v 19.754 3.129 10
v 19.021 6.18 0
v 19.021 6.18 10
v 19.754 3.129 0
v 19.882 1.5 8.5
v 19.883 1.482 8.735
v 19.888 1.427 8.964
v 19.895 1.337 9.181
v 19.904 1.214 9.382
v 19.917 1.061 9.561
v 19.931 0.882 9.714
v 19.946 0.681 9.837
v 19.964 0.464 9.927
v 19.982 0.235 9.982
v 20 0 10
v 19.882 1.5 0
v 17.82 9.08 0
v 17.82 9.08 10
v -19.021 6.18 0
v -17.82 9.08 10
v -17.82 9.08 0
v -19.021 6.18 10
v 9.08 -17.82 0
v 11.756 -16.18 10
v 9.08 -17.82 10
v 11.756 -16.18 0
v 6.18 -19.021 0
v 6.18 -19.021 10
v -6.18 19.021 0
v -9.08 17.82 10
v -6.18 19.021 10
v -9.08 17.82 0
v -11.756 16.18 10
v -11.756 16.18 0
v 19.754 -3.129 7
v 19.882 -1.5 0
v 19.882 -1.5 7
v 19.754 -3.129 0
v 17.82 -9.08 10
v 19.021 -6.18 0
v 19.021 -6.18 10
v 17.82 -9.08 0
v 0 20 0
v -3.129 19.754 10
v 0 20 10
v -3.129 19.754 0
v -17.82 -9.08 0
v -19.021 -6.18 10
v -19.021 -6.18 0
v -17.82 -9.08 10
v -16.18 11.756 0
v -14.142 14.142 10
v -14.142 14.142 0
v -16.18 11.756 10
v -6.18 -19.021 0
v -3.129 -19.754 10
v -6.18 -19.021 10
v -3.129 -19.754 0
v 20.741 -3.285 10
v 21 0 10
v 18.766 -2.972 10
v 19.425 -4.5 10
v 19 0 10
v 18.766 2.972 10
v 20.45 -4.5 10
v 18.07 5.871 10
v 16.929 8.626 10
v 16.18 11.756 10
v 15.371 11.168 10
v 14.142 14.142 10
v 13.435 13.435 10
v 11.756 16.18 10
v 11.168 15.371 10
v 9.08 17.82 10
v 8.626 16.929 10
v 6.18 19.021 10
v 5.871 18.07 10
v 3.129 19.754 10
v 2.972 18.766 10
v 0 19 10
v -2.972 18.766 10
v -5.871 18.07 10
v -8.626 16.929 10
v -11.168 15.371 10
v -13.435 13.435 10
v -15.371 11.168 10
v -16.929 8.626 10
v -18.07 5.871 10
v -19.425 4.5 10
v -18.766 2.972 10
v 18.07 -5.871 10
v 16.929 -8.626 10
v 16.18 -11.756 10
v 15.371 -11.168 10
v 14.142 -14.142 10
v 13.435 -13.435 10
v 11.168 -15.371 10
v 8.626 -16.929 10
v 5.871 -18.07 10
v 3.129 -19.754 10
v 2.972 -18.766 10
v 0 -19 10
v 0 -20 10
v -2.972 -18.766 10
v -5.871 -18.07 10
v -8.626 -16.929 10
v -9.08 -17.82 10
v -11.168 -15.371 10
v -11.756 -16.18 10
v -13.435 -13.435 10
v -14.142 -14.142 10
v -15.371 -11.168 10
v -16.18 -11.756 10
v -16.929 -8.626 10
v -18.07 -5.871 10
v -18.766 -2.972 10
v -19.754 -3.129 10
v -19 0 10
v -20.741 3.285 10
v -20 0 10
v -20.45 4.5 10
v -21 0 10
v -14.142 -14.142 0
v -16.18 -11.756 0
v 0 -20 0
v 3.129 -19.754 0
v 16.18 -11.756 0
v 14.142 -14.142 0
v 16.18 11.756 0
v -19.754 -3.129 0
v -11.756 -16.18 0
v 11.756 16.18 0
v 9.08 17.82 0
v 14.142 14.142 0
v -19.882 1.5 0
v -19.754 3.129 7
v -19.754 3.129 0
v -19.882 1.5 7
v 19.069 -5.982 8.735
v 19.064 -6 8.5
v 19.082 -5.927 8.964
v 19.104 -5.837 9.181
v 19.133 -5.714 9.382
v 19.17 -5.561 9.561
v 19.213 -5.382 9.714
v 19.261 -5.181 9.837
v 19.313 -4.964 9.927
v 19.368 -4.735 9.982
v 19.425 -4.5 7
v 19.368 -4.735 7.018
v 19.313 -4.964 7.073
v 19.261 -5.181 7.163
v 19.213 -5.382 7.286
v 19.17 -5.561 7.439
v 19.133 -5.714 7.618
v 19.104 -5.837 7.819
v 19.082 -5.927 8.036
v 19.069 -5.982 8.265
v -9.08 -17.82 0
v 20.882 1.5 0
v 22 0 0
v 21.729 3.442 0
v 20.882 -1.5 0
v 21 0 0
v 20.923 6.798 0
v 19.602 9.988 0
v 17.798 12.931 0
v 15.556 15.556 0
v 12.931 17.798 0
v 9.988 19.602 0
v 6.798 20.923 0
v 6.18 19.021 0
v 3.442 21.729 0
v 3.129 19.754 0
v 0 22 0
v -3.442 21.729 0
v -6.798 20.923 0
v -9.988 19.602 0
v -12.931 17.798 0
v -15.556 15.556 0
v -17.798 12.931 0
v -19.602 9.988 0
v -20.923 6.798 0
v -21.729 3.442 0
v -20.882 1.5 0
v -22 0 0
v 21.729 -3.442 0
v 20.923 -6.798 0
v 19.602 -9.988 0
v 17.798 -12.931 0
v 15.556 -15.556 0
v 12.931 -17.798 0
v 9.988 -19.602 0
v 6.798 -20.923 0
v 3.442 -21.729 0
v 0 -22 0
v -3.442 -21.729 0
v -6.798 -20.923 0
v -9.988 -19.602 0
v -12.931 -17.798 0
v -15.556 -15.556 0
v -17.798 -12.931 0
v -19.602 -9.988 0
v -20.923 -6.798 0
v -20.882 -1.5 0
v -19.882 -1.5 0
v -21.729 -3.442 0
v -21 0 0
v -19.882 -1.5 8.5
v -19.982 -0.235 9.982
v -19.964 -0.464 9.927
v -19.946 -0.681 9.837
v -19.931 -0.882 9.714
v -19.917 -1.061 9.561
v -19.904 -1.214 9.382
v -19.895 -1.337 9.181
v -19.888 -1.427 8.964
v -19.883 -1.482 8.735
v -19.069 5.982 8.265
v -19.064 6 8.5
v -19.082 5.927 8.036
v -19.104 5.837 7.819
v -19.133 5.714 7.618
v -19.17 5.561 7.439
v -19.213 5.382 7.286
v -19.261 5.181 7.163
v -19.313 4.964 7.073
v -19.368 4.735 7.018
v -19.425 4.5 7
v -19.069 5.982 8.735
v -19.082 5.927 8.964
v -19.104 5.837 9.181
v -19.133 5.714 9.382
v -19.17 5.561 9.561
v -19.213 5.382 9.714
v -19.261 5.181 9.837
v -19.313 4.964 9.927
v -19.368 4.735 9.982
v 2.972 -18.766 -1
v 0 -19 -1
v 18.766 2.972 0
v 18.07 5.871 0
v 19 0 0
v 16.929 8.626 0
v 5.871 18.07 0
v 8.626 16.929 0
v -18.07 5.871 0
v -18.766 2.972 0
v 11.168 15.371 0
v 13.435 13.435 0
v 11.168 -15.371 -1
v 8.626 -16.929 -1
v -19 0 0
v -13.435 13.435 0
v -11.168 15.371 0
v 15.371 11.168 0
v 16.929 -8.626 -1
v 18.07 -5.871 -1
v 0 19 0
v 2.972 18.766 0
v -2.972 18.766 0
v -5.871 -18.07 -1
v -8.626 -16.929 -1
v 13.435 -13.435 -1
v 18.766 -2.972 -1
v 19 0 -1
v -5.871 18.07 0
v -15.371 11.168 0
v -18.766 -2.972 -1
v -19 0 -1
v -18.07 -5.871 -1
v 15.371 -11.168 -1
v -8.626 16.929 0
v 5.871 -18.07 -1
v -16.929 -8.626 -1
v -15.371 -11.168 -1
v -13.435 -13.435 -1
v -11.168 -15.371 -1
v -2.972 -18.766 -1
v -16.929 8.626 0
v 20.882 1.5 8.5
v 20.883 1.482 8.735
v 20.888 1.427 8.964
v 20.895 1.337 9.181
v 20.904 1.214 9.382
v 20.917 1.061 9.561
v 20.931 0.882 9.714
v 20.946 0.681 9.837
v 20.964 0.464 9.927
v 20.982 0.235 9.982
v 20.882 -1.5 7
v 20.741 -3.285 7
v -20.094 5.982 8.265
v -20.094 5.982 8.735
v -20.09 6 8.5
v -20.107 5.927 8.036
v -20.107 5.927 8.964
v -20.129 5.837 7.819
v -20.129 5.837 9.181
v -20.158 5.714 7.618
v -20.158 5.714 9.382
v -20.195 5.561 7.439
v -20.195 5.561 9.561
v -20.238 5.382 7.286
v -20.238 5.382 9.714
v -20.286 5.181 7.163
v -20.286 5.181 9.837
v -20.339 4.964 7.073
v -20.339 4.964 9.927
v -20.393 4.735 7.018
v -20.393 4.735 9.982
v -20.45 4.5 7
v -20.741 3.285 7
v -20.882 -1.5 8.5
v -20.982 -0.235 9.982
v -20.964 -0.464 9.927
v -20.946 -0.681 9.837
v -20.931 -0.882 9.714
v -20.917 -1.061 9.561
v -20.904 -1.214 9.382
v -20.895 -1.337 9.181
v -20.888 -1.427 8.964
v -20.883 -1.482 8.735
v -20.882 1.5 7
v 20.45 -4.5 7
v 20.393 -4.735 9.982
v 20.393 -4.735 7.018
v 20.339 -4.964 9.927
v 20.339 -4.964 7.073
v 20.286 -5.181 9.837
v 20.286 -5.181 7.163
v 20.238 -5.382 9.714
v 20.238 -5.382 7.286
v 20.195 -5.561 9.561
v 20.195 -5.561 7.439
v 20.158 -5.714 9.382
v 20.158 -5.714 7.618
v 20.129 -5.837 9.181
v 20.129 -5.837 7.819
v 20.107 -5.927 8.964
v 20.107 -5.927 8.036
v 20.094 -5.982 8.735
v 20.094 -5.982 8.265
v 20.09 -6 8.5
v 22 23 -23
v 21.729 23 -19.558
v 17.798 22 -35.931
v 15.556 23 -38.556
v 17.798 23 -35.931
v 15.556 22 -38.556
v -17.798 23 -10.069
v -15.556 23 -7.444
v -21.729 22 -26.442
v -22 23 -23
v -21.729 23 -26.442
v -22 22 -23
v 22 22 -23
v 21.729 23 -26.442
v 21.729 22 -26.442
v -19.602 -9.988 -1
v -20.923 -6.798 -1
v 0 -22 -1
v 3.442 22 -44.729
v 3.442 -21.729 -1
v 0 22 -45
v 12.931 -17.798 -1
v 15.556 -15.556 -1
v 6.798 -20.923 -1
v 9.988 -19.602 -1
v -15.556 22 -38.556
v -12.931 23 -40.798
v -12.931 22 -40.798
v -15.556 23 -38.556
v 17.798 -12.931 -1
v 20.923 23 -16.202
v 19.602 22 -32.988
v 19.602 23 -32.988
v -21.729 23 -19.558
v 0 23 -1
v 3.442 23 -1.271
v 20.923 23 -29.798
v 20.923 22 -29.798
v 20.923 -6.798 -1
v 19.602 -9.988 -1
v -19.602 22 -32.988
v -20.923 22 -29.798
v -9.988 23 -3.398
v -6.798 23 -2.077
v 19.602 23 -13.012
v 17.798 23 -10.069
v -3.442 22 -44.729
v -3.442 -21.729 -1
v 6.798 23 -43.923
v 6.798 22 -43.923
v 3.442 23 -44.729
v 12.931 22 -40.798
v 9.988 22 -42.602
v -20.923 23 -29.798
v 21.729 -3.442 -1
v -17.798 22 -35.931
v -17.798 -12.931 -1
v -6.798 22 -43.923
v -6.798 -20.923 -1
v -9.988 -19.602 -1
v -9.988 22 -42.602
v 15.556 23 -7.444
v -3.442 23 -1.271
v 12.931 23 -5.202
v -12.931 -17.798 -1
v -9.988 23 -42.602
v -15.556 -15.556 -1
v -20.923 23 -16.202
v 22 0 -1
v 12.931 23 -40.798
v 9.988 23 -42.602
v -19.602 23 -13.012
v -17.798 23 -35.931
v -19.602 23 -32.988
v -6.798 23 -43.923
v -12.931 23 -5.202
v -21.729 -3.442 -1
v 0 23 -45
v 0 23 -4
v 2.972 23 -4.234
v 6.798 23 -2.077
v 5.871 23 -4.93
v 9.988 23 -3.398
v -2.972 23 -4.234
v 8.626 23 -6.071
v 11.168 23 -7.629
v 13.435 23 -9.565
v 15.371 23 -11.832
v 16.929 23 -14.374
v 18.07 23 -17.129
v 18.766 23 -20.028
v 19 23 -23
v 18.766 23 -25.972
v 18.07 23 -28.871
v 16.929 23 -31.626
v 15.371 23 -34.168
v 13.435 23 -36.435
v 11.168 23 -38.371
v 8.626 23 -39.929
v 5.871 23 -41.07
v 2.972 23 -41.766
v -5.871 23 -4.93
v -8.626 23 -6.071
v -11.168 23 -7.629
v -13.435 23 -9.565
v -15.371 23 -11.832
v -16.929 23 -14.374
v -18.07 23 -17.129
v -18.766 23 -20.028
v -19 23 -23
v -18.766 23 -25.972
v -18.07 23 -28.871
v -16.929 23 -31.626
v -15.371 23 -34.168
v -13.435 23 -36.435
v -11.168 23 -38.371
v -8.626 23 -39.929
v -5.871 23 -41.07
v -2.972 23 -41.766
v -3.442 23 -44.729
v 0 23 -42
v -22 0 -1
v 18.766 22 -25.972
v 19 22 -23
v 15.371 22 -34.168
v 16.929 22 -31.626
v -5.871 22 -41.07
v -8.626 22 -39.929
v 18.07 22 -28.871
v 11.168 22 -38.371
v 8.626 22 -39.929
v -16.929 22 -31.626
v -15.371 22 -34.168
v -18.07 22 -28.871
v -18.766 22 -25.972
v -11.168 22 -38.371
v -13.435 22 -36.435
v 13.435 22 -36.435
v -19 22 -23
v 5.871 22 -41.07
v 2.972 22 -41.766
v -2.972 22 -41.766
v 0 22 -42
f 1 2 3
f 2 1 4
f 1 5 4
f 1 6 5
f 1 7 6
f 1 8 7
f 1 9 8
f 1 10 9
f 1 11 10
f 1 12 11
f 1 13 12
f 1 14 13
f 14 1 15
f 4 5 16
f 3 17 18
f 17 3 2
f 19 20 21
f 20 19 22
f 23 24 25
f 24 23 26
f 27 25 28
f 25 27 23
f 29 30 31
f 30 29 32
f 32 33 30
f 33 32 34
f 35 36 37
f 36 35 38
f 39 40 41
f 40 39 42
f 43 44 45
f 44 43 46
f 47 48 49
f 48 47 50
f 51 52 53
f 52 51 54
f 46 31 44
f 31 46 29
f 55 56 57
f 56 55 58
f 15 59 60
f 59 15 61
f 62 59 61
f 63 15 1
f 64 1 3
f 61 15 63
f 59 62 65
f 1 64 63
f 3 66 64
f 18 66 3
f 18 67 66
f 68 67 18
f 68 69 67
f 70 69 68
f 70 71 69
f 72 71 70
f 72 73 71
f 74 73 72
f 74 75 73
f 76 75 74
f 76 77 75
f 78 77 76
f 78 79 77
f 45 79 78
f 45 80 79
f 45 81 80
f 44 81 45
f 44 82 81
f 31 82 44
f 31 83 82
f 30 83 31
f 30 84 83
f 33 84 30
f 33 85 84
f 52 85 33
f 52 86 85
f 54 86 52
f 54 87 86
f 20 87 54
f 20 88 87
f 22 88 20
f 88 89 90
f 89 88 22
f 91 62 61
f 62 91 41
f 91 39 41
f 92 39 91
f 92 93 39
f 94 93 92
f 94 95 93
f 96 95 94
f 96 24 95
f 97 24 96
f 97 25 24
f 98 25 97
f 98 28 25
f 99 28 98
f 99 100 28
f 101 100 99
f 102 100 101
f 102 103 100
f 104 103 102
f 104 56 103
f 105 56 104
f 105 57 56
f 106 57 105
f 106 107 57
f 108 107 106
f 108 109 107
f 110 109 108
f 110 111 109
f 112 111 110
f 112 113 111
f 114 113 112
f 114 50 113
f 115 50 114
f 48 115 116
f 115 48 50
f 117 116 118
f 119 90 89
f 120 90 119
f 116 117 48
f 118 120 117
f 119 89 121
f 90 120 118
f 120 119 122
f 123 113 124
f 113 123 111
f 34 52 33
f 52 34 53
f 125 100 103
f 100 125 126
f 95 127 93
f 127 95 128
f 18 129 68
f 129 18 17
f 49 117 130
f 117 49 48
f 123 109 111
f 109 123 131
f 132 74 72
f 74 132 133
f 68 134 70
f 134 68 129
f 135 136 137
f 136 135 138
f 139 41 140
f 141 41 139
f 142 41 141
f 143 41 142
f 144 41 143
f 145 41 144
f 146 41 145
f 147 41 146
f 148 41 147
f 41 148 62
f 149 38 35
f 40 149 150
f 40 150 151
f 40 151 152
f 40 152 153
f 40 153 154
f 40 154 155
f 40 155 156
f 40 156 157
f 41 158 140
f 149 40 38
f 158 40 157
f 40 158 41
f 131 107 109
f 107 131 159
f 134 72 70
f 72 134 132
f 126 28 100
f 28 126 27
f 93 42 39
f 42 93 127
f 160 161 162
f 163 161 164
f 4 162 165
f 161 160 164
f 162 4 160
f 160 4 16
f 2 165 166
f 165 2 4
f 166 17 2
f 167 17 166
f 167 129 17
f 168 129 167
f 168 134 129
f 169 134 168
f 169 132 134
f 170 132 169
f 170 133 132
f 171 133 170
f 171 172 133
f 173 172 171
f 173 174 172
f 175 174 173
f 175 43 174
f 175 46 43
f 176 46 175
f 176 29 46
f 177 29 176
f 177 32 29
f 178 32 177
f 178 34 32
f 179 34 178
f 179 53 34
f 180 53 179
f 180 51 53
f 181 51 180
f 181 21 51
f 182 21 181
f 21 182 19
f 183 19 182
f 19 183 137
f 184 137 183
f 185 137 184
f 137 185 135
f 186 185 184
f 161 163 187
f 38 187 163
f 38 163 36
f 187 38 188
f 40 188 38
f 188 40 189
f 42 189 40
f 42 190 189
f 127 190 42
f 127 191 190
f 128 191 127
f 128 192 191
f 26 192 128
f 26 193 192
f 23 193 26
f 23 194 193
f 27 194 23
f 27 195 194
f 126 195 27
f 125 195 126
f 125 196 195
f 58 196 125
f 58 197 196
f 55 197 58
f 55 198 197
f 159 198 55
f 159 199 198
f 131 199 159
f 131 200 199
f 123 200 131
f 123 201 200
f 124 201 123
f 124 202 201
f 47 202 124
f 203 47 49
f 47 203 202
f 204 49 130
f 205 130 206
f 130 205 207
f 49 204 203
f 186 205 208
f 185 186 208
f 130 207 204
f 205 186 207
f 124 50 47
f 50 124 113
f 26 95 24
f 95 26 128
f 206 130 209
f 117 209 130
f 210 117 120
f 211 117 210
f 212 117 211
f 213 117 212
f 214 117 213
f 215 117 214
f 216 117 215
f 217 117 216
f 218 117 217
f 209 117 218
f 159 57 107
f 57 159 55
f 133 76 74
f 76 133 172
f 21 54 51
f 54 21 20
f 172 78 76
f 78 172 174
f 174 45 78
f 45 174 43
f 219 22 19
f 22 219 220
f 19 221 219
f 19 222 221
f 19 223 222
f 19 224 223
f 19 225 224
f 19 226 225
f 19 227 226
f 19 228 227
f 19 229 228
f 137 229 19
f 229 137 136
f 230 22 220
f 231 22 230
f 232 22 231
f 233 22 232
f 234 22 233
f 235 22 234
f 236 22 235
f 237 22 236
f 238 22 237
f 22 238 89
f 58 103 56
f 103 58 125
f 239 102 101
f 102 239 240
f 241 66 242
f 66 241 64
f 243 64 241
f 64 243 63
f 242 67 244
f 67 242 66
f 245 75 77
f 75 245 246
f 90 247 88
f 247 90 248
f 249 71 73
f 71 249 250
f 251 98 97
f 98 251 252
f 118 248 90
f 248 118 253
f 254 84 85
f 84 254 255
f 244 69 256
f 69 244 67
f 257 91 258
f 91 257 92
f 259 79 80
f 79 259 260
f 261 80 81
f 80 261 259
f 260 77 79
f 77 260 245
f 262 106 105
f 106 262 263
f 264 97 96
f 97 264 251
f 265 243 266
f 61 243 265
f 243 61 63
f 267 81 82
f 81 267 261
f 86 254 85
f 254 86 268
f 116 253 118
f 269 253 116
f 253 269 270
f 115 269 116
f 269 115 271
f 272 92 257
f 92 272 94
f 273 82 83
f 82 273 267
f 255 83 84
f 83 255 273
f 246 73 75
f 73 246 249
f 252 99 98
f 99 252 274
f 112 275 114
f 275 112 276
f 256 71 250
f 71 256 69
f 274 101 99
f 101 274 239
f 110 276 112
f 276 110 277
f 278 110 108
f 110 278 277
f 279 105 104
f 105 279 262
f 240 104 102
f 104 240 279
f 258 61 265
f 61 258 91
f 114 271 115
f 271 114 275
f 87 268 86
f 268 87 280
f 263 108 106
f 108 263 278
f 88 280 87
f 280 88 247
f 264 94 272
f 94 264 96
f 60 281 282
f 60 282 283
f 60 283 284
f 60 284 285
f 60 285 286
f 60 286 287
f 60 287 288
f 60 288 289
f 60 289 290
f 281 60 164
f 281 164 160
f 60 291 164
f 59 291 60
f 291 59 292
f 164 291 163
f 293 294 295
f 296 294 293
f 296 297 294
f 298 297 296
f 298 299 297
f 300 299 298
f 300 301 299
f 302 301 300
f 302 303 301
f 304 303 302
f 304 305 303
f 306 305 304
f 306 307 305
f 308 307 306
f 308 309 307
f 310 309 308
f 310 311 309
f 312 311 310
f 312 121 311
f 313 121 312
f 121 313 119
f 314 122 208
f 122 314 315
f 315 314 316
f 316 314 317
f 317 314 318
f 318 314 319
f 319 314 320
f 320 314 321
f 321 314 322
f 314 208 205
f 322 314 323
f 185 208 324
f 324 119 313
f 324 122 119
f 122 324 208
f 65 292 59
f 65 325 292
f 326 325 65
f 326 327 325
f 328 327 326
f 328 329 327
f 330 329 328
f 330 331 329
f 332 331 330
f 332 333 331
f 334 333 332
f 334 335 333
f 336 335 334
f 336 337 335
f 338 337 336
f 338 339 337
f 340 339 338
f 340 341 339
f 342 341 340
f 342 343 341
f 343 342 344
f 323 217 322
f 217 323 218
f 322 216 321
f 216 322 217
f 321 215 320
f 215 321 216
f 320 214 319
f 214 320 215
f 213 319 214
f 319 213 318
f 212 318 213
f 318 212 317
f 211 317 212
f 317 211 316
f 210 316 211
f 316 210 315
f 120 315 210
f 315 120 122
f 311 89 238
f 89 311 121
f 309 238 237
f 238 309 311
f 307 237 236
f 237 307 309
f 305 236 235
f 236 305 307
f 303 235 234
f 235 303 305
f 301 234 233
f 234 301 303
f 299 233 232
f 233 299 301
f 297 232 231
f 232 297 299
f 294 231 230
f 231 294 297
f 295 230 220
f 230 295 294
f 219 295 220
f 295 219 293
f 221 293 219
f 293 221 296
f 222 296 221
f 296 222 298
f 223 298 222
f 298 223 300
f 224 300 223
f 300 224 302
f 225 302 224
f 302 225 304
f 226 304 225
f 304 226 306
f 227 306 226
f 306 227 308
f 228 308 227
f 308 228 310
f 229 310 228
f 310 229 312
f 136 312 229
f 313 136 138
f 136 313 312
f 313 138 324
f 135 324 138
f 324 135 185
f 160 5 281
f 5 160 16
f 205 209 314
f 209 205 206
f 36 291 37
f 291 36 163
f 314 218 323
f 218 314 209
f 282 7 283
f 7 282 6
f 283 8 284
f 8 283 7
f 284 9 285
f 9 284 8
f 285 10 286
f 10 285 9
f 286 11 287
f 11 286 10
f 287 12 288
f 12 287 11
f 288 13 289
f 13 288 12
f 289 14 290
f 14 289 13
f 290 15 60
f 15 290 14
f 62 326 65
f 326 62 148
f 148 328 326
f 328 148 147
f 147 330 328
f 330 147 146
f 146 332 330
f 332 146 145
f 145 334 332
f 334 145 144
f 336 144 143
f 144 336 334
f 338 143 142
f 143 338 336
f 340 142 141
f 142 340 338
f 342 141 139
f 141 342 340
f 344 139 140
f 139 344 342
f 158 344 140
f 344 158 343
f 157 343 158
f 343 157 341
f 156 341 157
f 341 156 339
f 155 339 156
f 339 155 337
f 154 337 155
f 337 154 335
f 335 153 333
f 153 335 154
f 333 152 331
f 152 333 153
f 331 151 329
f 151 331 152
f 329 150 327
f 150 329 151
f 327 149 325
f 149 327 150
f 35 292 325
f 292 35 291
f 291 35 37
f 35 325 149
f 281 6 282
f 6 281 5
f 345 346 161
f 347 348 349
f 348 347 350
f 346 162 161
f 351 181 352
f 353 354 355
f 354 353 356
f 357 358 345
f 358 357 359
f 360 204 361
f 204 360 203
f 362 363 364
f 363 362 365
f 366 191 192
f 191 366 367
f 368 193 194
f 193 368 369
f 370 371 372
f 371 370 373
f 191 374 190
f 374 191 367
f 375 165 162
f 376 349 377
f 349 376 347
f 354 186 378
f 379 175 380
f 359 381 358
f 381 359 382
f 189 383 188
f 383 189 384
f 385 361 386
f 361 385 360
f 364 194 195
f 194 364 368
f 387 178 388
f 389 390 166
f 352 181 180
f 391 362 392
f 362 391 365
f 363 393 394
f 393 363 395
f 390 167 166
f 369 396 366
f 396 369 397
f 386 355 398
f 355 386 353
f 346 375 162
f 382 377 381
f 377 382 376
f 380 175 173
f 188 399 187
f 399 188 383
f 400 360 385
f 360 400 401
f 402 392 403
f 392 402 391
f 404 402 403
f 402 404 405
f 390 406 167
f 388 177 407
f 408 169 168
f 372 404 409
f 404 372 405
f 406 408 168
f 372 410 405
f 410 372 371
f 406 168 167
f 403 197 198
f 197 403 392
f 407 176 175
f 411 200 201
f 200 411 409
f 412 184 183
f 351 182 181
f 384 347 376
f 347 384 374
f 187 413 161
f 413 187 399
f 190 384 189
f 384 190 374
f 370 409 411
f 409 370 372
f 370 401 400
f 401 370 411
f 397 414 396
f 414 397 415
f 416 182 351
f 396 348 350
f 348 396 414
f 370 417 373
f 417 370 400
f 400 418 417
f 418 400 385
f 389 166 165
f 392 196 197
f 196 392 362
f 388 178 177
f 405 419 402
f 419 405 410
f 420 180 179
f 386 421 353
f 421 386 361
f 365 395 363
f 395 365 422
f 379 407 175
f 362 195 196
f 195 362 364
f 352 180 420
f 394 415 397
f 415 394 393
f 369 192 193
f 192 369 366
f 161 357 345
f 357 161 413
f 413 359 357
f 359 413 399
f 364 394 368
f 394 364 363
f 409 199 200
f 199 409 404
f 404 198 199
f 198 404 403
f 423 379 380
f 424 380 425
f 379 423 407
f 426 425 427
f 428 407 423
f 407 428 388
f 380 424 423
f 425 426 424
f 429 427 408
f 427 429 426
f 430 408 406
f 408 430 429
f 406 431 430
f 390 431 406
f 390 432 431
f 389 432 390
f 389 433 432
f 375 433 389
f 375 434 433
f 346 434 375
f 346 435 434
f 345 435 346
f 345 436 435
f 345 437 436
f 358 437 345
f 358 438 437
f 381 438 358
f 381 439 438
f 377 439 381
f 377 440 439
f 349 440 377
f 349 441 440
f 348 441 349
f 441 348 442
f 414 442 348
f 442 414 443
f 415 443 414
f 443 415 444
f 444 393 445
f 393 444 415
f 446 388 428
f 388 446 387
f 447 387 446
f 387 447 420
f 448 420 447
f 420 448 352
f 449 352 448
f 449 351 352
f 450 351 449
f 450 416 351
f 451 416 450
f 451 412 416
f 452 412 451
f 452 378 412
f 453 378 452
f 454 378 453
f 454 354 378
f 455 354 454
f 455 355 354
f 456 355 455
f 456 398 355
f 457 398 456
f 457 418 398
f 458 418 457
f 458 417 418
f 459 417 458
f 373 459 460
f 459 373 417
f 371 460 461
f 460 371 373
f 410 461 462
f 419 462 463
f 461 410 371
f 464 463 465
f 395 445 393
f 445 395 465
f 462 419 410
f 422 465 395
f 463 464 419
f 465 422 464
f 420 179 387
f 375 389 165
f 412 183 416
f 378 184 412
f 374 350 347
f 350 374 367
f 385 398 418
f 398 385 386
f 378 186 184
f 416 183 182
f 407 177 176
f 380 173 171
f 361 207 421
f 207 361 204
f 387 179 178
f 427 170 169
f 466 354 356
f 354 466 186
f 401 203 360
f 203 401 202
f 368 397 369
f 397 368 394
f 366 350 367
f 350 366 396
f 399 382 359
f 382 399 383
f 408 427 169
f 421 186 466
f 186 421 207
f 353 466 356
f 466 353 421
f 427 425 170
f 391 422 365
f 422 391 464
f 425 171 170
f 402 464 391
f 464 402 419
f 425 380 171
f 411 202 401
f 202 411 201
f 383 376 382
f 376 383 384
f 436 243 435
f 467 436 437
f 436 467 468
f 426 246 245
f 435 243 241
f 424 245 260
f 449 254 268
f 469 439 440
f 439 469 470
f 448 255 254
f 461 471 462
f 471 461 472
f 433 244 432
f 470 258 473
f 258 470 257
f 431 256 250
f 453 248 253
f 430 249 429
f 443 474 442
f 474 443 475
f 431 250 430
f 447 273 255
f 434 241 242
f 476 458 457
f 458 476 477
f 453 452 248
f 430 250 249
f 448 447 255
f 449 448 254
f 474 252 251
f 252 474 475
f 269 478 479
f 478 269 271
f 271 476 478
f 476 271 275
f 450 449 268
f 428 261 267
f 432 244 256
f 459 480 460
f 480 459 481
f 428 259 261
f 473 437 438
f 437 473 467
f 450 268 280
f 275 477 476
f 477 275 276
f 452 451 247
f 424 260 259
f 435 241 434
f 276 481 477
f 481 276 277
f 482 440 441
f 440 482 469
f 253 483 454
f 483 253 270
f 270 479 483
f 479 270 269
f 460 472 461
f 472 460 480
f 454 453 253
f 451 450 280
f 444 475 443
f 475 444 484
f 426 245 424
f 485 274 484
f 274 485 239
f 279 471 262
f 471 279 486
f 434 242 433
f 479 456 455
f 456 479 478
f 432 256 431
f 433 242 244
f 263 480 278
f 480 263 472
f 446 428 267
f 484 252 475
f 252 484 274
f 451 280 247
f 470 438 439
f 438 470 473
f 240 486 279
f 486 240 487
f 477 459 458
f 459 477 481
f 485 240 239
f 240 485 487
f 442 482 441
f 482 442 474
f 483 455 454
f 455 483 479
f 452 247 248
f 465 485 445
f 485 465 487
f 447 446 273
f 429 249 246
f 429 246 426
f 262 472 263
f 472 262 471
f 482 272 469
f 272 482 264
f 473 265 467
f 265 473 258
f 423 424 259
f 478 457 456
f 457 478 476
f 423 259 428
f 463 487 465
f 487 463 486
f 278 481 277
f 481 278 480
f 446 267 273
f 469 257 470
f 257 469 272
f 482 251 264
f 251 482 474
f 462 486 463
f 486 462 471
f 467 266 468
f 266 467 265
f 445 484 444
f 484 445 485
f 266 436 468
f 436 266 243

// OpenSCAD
// file: modules/tube.scad
/***********
 * Modules *
 ***********/
 module tube (h, inner_r, thick, closed=false) {
     difference() {
         cylinder(h, r=inner_r + thick);
         if(closed) {
             translate([0, 0, -1]) cylinder(h + 1 - thick, r=inner_r);

         } else {
            translate([0, 0, -1]) cylinder(h + 2, r=inner_r);
         }
     }
 }
// file: modules/tie.scad
/*****************
 * Configuration *
 *****************/
// width for the L of the tie
L_width = 3;
// detach length for the L of the tie
L_detach = 6;

/***********
 * Modules *
 ***********/
// Module to create a rounded L
module L(h, add_offset=0) {
    union() {
        hull() {
            square(L_width, center=true);
            translate([0, -add_offset, 0]) square(L_width, center=true);
            translate([h - L_width / 2, 0, 0]) circle(L_width / 2);
            translate([h - L_width / 2, -add_offset, 0]) circle(L_width / 2);
        }
        hull() {
            translate([h - L_width / 2, 0, 0]) circle(L_width / 2);
            translate([h - L_width / 2, L_detach - L_width / 2 , 0]) circle(L_width / 2);
        }
    }
}
// module to create a spinning tie with custom form
module tie_with(h, r, thick) {
    intersection() {
        // extruded cylinder to hold the L
        difference() {
            cylinder(h, r=r + thick);
            translate([0, 0, -1]) cylinder(h+2, r=r);
        }
        // 2 L to perform the tie
        union() {
            children();
            rotate([0, 0, 180]) children();
        }
    }
}
// module to create a spinning tie
module tie(h, r, thick) {
    tie_with(h, r, thick) rotate([0, -90, 0]) linear_extrude(r + 2 * thick) L(h);
}
// reverse module of the spinning tie: use it to diff a solid which must
// accept the spinning tie
module tie_r(h, r, thick) {
    // use a L with the vertical bar larger
    tie_with(h, r, thick) rotate([0, -90, 0]) linear_extrude(r + 2 * thick) L(h, L_detach);
}
// file: modules/dispenser.scad
include<tie.scad>;
include<tube.scad>;

/***********
 * Modules *
 ***********/
module dispenser() {
    tie_outer_radius = opening_size / 2; // radius of the tie part - forced by case.scad
    tie_thickness = thickness / 2; // thickness of the tie part
    outer_radius = tie_outer_radius + thickness; // global radius - forced by case.scad
    inner_radius = tie_outer_radius - tie_thickness;
    // tie to the spring container
    tube(tie_length, inner_radius, tie_thickness);
    tie(tie_length, tie_outer_radius, thickness / 2);
    // curved slop
    translate([0, 0, -1]) { // reclaim the heigth of the first cylinder
        difference() {
            hull() {
                cylinder(1, r=outer_radius);
                translate([0, outer_radius, -outer_radius]) rotate([-90, 0, 0]) cylinder(1, r=outer_radius);
            }
            hull() {
                cylinder(1, r=inner_radius);
                translate([0, outer_radius, -outer_radius]) rotate([-90, 0, 0]) cylinder(1, r=inner_radius);
            }
        }
    }
}
// file: config.scad
/*****************
 * Configuration *
 *****************/
/*
 * Global
 */

// Resolution
$fn = 40;


/*
 * Spinner
 */

// radius for the spinner (inner and outer)
external_radius = 35 / 2;
internal_radius = 20 / 2;

// pitch - distance between coils (real opening)
pitch = 25;

// length of the spring part
spring_length = 100;
// length of the attach part
attach_length = 20;

// spring resolution - in degrees
step = 5;


/*
 * Spinner container
 */

// Size of the hole for food input/output
opening_size = 40;

// thickness of sides
thickness = 2;

// tie length
tie_length = 10;

/*
 * Motor
 */

// radius of the motor axis
motor_axis_rad = 1;

// radius of the motor
motor_radius = 12;

// length of the motor
motor_length = 20;
// main file
include<config.scad>;
include<modules/dispenser.scad>;

/*************
 * 3D Models *
 *************/
dispenser();
